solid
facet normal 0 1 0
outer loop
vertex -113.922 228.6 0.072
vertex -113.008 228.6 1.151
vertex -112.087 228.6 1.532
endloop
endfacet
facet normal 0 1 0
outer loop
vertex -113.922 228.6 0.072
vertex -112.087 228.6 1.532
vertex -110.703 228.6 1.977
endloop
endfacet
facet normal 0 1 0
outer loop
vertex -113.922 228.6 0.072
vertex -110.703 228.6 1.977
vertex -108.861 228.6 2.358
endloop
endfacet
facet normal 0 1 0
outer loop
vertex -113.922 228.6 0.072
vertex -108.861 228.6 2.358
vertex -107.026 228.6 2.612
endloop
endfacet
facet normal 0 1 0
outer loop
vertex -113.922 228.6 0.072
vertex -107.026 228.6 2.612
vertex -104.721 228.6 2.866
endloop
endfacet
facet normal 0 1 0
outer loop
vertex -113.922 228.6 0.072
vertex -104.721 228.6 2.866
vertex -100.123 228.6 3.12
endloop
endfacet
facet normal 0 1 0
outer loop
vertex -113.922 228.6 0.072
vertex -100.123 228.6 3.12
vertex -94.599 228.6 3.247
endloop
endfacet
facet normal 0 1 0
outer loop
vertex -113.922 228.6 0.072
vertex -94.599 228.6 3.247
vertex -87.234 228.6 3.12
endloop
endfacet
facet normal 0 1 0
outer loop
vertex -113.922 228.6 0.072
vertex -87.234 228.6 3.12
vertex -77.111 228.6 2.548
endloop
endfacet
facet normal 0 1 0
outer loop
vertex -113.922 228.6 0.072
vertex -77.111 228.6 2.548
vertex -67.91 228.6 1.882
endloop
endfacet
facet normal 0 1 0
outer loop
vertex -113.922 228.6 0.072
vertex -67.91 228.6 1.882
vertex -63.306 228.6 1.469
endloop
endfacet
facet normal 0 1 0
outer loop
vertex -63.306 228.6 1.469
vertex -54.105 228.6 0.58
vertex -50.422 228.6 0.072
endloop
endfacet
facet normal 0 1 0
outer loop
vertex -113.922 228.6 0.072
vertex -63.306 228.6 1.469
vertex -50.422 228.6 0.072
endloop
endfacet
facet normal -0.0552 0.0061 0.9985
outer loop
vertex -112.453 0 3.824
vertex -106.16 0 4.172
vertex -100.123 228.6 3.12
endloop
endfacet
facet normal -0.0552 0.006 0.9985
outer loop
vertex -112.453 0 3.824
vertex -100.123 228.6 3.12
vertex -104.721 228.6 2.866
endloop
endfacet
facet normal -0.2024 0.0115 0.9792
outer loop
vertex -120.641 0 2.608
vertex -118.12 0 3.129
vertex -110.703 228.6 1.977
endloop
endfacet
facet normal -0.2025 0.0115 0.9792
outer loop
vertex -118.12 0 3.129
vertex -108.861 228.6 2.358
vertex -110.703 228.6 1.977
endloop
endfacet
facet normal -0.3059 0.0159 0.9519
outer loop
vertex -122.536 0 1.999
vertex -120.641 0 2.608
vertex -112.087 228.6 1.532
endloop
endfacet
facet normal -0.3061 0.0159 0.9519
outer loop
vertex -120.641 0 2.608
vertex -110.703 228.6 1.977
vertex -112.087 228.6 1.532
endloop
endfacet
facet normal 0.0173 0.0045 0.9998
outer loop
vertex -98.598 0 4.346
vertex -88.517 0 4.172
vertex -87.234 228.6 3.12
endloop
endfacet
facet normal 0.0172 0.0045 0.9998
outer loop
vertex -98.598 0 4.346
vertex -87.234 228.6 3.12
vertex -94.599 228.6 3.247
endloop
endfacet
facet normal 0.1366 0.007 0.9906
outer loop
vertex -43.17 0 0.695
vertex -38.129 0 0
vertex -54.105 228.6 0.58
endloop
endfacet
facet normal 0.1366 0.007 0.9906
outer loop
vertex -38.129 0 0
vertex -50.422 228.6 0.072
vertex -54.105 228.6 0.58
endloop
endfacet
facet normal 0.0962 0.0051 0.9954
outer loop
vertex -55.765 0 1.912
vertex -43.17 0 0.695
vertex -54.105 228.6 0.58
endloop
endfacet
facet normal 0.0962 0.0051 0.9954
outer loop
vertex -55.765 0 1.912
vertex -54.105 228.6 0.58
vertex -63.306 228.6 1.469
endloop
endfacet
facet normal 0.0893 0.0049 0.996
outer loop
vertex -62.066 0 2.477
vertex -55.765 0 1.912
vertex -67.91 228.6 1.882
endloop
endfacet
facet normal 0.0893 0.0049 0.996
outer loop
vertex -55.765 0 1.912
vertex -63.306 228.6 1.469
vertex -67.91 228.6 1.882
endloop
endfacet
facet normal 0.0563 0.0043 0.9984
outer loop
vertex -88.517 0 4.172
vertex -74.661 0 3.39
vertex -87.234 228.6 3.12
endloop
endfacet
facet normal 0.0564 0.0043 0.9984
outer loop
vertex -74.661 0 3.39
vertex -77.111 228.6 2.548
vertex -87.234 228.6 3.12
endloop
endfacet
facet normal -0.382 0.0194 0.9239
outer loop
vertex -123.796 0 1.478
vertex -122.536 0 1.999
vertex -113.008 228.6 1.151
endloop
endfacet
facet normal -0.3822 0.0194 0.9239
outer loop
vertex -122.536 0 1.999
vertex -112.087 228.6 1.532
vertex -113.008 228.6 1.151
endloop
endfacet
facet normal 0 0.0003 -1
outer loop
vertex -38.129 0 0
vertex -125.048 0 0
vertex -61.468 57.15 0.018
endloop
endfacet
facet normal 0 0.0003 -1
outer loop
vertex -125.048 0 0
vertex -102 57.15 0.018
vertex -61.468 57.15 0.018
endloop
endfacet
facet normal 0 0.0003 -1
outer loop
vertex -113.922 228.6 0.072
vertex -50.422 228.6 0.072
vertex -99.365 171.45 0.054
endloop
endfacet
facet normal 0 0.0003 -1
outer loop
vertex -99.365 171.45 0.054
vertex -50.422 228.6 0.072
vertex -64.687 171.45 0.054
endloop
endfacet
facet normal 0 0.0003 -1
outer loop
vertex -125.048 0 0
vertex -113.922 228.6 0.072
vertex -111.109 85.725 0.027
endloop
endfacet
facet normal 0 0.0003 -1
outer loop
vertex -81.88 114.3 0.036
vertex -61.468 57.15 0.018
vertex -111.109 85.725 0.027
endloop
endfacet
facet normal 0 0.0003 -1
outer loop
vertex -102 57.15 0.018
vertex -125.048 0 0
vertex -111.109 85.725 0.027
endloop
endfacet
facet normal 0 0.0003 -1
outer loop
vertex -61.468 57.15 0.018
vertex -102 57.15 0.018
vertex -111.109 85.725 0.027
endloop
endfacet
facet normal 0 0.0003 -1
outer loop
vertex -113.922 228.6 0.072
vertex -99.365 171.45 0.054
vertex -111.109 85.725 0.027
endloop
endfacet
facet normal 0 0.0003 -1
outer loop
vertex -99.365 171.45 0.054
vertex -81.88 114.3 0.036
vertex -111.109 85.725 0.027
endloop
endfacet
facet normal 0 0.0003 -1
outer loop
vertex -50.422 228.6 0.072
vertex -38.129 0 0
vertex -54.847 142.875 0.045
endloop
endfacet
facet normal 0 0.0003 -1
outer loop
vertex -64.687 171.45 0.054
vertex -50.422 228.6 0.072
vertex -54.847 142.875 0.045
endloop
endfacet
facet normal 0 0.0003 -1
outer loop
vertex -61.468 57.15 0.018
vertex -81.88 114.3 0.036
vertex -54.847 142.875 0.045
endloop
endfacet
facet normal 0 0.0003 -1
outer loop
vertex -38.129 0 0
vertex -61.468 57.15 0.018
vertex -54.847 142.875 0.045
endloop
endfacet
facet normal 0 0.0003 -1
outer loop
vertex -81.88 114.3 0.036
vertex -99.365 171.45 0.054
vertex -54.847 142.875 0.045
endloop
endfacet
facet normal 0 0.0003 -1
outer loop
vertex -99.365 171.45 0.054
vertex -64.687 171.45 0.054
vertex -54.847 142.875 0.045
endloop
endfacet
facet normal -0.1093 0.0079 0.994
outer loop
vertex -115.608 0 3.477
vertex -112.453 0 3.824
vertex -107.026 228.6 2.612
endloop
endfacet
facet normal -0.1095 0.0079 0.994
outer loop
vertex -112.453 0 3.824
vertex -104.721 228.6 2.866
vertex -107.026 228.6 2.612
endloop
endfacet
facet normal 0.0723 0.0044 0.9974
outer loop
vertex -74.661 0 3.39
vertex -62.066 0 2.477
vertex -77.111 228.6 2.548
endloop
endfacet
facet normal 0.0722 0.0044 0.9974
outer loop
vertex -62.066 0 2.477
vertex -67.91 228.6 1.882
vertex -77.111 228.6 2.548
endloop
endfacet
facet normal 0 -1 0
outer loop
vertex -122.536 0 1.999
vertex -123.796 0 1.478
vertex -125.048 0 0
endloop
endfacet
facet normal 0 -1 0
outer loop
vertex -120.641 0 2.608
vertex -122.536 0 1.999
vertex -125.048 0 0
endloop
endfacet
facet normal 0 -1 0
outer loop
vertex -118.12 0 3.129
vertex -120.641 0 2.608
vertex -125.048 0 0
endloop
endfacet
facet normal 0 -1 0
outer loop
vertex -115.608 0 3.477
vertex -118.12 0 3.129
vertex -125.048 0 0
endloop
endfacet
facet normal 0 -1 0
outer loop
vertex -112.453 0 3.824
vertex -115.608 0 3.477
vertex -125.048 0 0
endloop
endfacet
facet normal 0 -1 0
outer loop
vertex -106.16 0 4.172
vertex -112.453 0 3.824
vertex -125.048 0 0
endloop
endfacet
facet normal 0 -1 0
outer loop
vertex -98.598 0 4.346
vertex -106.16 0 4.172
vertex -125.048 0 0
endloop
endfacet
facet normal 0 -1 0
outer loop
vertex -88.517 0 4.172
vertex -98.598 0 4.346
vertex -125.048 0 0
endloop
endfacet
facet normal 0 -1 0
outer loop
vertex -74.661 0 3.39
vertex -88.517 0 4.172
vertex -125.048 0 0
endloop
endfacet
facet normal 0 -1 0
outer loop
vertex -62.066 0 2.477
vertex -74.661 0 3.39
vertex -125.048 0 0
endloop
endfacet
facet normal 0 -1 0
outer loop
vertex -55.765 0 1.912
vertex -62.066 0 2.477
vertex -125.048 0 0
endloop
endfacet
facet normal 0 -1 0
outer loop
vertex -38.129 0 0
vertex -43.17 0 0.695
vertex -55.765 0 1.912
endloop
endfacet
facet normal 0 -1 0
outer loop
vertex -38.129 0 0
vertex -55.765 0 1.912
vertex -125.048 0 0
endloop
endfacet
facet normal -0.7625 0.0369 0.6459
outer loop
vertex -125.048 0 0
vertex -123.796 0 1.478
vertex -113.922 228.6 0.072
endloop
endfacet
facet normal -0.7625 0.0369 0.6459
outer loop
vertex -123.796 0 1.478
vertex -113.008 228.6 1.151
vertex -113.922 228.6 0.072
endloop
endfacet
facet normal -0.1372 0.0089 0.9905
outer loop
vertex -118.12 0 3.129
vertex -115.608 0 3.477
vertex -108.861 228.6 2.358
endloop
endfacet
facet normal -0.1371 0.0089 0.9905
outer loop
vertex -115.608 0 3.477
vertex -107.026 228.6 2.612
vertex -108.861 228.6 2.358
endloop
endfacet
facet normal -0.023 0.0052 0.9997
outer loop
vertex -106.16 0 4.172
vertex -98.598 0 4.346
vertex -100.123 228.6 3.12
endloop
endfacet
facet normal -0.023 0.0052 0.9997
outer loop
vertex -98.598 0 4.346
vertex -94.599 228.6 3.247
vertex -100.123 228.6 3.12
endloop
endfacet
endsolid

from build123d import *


with BuildPart() as f3:
    # F1 (on Front) → F3 section 0
    with BuildSketch(Plane.XZ):
        Polygon((-125.047788, 0), (-38.128988, 0), (-43.170278, 0.69535), (-55.764813, 1.912214), (-62.066426, 2.477186), (-74.66096, 3.389833), (-88.516686, 4.172102), (-98.598397, 4.34594), (-106.160333, 4.172102), (-112.453254, 3.824427), (-115.608406, 3.476752), (-118.12036, 3.129077), (-120.641005, 2.607564), (-122.535835, 1.999132), (-123.796157, 1.47762), align=None)
    # F2 (on offset) → F3 section 1
    with BuildSketch(Plane.XZ.offset(-228.6)):
        Polygon((-113.007563, 1.151306), (-113.921963, 0.071806), (-50.421963, 0.071806), (-54.104963, 0.579806), (-63.306113, 1.468806), (-67.909863, 1.881556), (-77.111013, 2.548306), (-87.233548, 3.119806), (-94.598913, 3.246806), (-100.123413, 3.119806), (-104.720813, 2.865806), (-107.025863, 2.611806), (-108.861013, 2.357806), (-110.702513, 1.976806), (-112.086813, 1.532306), align=None)
    loft()


solid = f3.part
